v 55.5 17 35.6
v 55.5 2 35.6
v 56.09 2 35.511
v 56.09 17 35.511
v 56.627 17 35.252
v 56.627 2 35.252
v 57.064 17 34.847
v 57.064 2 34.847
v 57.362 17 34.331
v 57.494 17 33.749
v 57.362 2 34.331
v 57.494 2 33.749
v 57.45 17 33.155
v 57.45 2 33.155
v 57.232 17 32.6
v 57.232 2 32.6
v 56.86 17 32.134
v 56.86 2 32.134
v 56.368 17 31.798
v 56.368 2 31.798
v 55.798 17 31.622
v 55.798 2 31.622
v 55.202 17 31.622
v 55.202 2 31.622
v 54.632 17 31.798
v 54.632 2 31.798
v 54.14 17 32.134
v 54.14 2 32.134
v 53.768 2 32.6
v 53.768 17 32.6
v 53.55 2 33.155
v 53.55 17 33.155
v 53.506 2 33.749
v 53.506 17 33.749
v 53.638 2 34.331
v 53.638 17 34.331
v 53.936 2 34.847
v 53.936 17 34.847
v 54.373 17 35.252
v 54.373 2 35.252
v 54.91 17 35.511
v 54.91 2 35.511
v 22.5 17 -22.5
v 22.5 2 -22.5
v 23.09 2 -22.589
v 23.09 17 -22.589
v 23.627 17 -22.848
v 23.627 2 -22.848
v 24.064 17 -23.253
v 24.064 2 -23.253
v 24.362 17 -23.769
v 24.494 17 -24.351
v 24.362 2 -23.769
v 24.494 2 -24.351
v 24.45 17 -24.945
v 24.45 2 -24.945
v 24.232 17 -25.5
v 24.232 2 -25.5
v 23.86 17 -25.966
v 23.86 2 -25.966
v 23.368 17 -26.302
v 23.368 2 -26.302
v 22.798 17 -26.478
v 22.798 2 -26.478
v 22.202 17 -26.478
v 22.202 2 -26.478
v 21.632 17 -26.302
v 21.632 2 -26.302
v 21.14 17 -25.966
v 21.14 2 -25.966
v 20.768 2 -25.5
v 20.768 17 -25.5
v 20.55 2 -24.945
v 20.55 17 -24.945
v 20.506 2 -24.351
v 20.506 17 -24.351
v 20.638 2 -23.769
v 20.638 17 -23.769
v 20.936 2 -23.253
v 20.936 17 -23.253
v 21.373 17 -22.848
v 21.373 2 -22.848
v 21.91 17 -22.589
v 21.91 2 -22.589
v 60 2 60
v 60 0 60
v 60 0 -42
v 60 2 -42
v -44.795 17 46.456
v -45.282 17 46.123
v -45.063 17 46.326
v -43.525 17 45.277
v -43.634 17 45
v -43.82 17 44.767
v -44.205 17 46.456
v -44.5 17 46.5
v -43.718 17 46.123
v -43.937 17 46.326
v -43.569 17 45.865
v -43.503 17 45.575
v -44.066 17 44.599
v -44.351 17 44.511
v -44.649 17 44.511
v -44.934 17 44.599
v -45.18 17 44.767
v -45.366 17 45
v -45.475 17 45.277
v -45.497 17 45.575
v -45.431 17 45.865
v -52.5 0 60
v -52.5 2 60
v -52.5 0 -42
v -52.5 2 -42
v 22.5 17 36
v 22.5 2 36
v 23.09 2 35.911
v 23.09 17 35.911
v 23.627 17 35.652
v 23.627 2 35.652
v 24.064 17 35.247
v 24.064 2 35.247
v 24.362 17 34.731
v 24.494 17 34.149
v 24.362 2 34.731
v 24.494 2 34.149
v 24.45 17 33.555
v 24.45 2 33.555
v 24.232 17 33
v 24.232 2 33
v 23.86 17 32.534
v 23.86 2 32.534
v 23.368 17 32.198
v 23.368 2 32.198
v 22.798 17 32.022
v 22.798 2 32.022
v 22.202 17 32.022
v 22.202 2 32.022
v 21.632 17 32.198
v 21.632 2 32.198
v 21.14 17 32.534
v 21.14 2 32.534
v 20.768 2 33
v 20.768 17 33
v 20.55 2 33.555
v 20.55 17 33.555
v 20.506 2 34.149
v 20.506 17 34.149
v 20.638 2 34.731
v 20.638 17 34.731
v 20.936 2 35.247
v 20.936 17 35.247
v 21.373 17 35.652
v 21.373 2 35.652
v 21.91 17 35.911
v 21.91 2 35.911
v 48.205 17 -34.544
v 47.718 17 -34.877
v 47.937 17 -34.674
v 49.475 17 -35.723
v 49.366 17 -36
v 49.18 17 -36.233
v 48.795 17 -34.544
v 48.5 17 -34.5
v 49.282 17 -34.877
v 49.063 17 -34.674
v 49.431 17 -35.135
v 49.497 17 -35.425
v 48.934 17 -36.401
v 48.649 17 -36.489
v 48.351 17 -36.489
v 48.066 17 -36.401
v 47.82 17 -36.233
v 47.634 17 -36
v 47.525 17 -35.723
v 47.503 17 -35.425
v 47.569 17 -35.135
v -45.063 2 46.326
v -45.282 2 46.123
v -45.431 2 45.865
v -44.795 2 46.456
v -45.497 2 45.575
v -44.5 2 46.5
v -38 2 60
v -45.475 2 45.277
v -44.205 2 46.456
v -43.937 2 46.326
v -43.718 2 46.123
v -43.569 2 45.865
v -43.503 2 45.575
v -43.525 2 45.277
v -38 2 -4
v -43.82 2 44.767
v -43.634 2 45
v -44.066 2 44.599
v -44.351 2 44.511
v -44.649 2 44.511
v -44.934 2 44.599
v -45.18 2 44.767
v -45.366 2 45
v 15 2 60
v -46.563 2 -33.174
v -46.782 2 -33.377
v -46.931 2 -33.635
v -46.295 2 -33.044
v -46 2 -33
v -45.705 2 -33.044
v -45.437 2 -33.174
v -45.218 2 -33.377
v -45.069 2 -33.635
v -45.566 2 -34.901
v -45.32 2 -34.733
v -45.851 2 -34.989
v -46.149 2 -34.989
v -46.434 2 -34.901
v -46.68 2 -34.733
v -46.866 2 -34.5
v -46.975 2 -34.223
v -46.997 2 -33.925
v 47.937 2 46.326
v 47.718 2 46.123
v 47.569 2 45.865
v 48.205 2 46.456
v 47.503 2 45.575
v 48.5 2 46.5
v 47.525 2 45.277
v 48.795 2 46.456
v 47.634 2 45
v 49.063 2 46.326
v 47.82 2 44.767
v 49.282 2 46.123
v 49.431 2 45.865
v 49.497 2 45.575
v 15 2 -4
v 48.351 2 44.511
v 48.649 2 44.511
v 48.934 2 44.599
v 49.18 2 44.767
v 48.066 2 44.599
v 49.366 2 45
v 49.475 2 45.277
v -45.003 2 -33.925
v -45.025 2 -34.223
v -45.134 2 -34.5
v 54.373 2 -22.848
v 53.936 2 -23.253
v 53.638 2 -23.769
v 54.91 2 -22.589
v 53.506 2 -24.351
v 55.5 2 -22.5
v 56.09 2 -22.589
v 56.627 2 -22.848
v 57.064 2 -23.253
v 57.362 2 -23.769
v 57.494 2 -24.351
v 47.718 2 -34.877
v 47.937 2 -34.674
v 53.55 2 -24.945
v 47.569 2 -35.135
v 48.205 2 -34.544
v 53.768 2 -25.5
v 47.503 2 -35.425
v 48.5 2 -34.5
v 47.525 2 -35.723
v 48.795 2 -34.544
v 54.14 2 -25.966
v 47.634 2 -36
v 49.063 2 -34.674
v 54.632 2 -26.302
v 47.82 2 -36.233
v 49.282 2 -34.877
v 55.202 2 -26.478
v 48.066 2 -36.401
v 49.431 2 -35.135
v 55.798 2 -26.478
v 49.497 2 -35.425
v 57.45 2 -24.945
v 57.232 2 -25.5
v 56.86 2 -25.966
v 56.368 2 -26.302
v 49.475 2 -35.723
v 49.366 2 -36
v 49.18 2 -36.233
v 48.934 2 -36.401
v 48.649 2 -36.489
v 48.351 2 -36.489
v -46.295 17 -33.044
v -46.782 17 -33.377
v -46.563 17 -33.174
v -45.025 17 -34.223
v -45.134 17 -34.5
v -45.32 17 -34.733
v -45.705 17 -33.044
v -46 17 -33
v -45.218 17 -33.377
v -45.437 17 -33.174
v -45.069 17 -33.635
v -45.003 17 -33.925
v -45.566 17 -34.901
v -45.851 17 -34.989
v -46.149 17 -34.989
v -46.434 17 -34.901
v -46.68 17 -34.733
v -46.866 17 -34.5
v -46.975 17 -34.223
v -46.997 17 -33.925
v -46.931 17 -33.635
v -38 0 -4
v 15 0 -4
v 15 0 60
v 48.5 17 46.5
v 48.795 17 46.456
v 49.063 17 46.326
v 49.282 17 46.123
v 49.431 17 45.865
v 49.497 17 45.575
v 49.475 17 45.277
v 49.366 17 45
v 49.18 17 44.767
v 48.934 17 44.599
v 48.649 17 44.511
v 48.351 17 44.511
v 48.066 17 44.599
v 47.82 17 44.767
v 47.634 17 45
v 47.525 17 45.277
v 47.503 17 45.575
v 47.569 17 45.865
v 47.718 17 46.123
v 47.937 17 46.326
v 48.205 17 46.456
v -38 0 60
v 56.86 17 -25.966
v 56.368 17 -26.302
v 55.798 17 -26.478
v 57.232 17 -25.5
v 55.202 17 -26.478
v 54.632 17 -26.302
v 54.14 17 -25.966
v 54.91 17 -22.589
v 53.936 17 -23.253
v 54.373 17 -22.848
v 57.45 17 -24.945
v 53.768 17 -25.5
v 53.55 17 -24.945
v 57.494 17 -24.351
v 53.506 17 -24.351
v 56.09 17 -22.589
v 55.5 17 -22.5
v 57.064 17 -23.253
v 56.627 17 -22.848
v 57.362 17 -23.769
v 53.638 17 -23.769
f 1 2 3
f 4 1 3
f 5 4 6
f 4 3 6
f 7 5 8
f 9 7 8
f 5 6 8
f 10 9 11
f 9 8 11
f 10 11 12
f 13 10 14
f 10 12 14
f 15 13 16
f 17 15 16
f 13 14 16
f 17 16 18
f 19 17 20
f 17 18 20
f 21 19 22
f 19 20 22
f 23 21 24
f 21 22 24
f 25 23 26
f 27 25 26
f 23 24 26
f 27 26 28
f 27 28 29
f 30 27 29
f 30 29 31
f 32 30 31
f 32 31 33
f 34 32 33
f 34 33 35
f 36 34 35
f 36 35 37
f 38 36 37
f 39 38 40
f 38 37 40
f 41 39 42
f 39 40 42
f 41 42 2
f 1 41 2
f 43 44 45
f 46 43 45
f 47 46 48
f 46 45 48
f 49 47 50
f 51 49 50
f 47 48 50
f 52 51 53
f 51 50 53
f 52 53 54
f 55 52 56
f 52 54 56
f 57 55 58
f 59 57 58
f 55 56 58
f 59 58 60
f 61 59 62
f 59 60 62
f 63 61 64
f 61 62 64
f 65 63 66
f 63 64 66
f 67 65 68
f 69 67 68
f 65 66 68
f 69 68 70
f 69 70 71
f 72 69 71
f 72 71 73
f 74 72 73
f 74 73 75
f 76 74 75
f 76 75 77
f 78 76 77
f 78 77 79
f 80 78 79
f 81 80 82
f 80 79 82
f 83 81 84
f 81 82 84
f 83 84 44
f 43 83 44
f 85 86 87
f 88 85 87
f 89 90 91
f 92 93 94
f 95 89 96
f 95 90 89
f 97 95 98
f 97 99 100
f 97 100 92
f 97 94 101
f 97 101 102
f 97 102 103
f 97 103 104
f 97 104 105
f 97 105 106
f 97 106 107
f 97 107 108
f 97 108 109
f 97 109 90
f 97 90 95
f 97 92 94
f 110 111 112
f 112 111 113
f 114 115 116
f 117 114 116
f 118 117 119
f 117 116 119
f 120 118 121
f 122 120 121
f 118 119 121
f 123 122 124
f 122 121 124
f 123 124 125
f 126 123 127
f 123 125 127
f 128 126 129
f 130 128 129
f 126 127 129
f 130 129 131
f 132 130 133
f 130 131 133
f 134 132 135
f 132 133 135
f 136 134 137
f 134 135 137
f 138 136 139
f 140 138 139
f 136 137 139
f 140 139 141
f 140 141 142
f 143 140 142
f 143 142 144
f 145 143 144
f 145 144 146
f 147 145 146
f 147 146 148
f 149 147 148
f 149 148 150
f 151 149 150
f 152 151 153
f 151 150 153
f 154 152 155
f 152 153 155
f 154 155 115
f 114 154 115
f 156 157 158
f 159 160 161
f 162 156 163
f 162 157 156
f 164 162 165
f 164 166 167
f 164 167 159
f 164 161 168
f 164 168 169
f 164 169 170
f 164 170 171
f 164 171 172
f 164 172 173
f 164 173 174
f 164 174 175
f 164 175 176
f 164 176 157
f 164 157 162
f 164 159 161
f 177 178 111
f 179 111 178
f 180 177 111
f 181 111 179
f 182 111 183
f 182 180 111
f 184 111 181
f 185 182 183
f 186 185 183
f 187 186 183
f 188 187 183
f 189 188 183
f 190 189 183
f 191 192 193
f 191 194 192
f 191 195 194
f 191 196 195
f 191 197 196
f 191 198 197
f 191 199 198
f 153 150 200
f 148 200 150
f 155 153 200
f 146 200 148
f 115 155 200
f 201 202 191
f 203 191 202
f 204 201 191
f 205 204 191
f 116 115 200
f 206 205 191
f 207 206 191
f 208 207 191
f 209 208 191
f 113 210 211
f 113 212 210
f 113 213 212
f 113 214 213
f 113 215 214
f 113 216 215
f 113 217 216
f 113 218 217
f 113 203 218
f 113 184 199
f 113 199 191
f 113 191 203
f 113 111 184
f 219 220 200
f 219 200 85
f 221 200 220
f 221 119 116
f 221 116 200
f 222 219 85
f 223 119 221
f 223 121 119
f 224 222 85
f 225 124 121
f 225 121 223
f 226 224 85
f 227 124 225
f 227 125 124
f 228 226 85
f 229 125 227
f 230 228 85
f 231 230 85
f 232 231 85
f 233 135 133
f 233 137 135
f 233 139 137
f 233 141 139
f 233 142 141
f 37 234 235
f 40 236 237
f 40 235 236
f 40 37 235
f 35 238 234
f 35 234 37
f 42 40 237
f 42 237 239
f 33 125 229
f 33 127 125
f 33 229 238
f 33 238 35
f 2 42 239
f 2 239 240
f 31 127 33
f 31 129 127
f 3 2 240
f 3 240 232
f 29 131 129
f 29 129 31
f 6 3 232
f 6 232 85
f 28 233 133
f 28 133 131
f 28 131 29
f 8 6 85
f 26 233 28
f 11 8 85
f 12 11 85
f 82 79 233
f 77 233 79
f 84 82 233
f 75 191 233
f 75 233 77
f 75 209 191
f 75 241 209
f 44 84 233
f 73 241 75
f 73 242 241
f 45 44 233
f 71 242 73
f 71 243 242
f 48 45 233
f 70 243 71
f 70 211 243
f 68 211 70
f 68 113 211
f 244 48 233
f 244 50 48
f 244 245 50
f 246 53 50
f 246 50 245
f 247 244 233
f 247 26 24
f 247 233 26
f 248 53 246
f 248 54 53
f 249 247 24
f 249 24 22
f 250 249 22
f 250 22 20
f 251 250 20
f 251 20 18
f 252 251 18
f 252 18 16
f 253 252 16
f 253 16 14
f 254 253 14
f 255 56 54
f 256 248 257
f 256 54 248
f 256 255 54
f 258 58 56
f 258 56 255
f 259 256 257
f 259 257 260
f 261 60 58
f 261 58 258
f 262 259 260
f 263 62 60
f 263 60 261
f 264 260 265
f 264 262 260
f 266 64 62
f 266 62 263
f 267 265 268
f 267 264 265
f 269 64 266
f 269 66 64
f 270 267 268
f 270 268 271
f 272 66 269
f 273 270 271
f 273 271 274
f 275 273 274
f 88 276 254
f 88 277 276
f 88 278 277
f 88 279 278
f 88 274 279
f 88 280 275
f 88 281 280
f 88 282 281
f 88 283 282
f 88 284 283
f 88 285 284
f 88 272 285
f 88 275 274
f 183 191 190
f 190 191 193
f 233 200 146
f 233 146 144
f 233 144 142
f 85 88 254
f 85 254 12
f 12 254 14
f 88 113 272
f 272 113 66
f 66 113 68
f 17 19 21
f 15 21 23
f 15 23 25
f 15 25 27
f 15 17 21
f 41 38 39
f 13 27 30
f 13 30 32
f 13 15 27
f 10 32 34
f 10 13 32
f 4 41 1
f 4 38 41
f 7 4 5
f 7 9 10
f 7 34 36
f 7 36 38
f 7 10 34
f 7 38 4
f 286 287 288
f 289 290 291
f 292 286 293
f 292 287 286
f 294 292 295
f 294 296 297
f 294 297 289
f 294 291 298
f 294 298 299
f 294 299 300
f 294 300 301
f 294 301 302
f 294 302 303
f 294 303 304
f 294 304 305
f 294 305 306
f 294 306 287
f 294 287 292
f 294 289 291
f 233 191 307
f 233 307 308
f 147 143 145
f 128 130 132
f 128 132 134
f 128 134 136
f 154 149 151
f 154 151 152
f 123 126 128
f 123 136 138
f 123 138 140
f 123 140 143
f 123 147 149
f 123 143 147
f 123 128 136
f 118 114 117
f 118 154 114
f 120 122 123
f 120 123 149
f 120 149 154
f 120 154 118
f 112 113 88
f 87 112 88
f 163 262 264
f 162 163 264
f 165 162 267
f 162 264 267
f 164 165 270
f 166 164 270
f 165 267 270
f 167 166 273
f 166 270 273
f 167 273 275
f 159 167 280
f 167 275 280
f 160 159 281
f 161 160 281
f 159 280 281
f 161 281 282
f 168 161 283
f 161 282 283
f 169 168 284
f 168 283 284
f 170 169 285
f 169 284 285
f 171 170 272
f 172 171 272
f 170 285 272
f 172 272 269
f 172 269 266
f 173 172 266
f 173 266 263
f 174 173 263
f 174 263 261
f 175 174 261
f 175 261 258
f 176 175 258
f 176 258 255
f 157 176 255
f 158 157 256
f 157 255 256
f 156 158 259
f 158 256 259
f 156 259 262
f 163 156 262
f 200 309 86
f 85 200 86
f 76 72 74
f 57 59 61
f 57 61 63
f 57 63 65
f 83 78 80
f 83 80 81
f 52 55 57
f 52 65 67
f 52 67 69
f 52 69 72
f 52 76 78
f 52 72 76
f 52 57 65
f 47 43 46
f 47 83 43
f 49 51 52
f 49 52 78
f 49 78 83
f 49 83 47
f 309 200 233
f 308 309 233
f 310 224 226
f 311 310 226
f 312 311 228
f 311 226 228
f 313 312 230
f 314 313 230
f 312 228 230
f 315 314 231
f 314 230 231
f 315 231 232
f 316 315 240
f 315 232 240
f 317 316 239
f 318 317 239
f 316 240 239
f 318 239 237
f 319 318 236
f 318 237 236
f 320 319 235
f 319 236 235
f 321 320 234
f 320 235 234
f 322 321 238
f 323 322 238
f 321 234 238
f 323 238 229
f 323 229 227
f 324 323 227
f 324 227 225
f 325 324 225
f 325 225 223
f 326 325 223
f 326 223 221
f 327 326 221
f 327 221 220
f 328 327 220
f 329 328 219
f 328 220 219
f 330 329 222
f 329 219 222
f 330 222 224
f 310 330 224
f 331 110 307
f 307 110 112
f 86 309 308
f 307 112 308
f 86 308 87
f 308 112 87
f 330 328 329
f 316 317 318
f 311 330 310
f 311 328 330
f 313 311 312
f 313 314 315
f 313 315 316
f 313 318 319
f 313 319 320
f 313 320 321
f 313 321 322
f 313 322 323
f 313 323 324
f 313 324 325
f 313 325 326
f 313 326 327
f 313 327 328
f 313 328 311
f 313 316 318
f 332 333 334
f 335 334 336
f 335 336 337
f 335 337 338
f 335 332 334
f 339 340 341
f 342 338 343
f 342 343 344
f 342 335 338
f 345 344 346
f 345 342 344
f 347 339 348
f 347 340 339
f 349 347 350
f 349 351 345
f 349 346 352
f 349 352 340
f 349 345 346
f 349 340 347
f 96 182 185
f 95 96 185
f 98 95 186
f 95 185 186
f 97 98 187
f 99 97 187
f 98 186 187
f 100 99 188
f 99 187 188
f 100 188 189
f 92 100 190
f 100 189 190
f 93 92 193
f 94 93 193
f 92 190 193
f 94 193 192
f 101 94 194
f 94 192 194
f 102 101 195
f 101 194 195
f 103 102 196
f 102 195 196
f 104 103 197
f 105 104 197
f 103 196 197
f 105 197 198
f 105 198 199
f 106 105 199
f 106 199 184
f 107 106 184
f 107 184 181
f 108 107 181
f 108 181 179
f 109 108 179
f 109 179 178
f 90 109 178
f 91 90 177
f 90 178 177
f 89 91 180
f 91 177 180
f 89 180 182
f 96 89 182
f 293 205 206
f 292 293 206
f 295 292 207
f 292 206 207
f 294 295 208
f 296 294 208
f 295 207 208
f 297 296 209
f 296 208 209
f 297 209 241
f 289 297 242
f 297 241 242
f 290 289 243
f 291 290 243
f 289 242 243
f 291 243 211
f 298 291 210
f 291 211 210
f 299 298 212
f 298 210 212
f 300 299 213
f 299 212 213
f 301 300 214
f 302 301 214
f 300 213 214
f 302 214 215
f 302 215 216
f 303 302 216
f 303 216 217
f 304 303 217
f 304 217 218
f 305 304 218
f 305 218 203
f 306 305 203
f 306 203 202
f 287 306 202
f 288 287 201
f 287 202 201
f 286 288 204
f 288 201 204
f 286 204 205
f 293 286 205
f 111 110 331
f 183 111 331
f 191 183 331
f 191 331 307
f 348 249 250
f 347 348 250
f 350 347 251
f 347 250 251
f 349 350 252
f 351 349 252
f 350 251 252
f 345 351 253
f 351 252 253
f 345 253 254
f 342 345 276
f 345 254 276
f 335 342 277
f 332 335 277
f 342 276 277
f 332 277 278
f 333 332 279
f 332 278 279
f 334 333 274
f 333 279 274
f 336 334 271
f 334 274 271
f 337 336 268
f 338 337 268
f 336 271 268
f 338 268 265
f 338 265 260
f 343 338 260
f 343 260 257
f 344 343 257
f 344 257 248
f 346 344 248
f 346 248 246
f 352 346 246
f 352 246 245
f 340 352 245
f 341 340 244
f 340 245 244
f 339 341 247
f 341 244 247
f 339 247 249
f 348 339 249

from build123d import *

# Parameters (mm, degrees)
SKETCH_1_W          = 120
SKETCH_1_H          = 120
EXTRUDE_1_DEPTH     = 2
SKETCH_2_R          = 2
SKETCH_2_R_2        = 1
EXTRUDE_2_DEPTH     = 15
SKETCH_3_W          = 53
SKETCH_3_H          = 18
SKETCH_3_W_2        = 45
SKETCH_3_W_3        = 14.5
SKETCH_3_W_4        = 7.5
SKETCH_3_H_2        = 13
SKETCH_3_H_3        = 89
CUT_EXTRUDE_3_DEPTH = 15
SKETCH_4_W          = 53
SKETCH_4_H          = 64
CUT_EXTRUDE_4_DEPTH = 15


with BuildPart() as part:
    # 스케치1 → 보스-돌출1 (new body)
    with BuildSketch(Plane(origin=(0, 0, 0), x_dir=(1, 0, 0), z_dir=(0, 1, 0))):
        Rectangle(SKETCH_1_W, SKETCH_1_H)
    extrude(amount=EXTRUDE_1_DEPTH)

    # 스케치2 → 보스-돌출2 (add)
    with BuildSketch(Plane(origin=(0, 2, 0), x_dir=(1, 0, 0), z_dir=(0, 1, 0))):
        with Locations(Location((55.5, 24.5, 0), (0, 0, 270))):
            Circle(SKETCH_2_R)
        with Locations(Location((55.5, -33.6, 0), (0, 0, 270))):
            Circle(SKETCH_2_R)
        with Locations(Location((48.5, -45.5, 0), (0, 0, 270))):
            Circle(SKETCH_2_R_2)
        with Locations(Location((22.5, -34, 0), (0, 0, 270))):
            Circle(SKETCH_2_R)
        with Locations(Location((22.5, 24.5, 0), (0, 0, 270))):
            Circle(SKETCH_2_R)
        with Locations(Location((48.5, 35.5, 0), (0, 0, 270))):
            Circle(SKETCH_2_R_2)
        with Locations(Location((-46, 34, 0), (0, 0, 270))):
            Circle(SKETCH_2_R_2)
        with Locations(Location((-44.5, -45.5, 0), (0, 0, 270))):
            Circle(SKETCH_2_R_2)
    extrude(amount=EXTRUDE_2_DEPTH)

    # 스케치3 → 컷-돌출3 (cut)
    with BuildSketch(Plane(origin=(0, 2, 0), x_dir=(1, 0, 0), z_dir=(0, 1, 0))):
        with Locations((-11.5, 51)):
            Rectangle(SKETCH_3_W, SKETCH_3_H)
        with Locations((37.5, 51)):
            Rectangle(SKETCH_3_W_2, SKETCH_3_H)
        with Locations((-45.25, 51)):
            Rectangle(SKETCH_3_W_3, SKETCH_3_H)
        with Locations((-56.25, 51)):
            Rectangle(SKETCH_3_W_4, SKETCH_3_H)
        with Locations((-56.25, 35.5)):
            Rectangle(SKETCH_3_W_4, SKETCH_3_H_2)
        with Locations((-56.25, -15.5)):
            Rectangle(SKETCH_3_W_4, SKETCH_3_H_3)
    extrude(amount=-CUT_EXTRUDE_3_DEPTH, mode=Mode.SUBTRACT)

    # 스케치4 → 컷-돌출4 (cut)
    with BuildSketch(Plane(origin=(0, 2, 0), x_dir=(1, 0, 0), z_dir=(0, 1, 0))):
        with Locations((-11.5, -28)):
            Rectangle(SKETCH_4_W, SKETCH_4_H)
    extrude(amount=-CUT_EXTRUDE_4_DEPTH, mode=Mode.SUBTRACT)


solid = part.part
